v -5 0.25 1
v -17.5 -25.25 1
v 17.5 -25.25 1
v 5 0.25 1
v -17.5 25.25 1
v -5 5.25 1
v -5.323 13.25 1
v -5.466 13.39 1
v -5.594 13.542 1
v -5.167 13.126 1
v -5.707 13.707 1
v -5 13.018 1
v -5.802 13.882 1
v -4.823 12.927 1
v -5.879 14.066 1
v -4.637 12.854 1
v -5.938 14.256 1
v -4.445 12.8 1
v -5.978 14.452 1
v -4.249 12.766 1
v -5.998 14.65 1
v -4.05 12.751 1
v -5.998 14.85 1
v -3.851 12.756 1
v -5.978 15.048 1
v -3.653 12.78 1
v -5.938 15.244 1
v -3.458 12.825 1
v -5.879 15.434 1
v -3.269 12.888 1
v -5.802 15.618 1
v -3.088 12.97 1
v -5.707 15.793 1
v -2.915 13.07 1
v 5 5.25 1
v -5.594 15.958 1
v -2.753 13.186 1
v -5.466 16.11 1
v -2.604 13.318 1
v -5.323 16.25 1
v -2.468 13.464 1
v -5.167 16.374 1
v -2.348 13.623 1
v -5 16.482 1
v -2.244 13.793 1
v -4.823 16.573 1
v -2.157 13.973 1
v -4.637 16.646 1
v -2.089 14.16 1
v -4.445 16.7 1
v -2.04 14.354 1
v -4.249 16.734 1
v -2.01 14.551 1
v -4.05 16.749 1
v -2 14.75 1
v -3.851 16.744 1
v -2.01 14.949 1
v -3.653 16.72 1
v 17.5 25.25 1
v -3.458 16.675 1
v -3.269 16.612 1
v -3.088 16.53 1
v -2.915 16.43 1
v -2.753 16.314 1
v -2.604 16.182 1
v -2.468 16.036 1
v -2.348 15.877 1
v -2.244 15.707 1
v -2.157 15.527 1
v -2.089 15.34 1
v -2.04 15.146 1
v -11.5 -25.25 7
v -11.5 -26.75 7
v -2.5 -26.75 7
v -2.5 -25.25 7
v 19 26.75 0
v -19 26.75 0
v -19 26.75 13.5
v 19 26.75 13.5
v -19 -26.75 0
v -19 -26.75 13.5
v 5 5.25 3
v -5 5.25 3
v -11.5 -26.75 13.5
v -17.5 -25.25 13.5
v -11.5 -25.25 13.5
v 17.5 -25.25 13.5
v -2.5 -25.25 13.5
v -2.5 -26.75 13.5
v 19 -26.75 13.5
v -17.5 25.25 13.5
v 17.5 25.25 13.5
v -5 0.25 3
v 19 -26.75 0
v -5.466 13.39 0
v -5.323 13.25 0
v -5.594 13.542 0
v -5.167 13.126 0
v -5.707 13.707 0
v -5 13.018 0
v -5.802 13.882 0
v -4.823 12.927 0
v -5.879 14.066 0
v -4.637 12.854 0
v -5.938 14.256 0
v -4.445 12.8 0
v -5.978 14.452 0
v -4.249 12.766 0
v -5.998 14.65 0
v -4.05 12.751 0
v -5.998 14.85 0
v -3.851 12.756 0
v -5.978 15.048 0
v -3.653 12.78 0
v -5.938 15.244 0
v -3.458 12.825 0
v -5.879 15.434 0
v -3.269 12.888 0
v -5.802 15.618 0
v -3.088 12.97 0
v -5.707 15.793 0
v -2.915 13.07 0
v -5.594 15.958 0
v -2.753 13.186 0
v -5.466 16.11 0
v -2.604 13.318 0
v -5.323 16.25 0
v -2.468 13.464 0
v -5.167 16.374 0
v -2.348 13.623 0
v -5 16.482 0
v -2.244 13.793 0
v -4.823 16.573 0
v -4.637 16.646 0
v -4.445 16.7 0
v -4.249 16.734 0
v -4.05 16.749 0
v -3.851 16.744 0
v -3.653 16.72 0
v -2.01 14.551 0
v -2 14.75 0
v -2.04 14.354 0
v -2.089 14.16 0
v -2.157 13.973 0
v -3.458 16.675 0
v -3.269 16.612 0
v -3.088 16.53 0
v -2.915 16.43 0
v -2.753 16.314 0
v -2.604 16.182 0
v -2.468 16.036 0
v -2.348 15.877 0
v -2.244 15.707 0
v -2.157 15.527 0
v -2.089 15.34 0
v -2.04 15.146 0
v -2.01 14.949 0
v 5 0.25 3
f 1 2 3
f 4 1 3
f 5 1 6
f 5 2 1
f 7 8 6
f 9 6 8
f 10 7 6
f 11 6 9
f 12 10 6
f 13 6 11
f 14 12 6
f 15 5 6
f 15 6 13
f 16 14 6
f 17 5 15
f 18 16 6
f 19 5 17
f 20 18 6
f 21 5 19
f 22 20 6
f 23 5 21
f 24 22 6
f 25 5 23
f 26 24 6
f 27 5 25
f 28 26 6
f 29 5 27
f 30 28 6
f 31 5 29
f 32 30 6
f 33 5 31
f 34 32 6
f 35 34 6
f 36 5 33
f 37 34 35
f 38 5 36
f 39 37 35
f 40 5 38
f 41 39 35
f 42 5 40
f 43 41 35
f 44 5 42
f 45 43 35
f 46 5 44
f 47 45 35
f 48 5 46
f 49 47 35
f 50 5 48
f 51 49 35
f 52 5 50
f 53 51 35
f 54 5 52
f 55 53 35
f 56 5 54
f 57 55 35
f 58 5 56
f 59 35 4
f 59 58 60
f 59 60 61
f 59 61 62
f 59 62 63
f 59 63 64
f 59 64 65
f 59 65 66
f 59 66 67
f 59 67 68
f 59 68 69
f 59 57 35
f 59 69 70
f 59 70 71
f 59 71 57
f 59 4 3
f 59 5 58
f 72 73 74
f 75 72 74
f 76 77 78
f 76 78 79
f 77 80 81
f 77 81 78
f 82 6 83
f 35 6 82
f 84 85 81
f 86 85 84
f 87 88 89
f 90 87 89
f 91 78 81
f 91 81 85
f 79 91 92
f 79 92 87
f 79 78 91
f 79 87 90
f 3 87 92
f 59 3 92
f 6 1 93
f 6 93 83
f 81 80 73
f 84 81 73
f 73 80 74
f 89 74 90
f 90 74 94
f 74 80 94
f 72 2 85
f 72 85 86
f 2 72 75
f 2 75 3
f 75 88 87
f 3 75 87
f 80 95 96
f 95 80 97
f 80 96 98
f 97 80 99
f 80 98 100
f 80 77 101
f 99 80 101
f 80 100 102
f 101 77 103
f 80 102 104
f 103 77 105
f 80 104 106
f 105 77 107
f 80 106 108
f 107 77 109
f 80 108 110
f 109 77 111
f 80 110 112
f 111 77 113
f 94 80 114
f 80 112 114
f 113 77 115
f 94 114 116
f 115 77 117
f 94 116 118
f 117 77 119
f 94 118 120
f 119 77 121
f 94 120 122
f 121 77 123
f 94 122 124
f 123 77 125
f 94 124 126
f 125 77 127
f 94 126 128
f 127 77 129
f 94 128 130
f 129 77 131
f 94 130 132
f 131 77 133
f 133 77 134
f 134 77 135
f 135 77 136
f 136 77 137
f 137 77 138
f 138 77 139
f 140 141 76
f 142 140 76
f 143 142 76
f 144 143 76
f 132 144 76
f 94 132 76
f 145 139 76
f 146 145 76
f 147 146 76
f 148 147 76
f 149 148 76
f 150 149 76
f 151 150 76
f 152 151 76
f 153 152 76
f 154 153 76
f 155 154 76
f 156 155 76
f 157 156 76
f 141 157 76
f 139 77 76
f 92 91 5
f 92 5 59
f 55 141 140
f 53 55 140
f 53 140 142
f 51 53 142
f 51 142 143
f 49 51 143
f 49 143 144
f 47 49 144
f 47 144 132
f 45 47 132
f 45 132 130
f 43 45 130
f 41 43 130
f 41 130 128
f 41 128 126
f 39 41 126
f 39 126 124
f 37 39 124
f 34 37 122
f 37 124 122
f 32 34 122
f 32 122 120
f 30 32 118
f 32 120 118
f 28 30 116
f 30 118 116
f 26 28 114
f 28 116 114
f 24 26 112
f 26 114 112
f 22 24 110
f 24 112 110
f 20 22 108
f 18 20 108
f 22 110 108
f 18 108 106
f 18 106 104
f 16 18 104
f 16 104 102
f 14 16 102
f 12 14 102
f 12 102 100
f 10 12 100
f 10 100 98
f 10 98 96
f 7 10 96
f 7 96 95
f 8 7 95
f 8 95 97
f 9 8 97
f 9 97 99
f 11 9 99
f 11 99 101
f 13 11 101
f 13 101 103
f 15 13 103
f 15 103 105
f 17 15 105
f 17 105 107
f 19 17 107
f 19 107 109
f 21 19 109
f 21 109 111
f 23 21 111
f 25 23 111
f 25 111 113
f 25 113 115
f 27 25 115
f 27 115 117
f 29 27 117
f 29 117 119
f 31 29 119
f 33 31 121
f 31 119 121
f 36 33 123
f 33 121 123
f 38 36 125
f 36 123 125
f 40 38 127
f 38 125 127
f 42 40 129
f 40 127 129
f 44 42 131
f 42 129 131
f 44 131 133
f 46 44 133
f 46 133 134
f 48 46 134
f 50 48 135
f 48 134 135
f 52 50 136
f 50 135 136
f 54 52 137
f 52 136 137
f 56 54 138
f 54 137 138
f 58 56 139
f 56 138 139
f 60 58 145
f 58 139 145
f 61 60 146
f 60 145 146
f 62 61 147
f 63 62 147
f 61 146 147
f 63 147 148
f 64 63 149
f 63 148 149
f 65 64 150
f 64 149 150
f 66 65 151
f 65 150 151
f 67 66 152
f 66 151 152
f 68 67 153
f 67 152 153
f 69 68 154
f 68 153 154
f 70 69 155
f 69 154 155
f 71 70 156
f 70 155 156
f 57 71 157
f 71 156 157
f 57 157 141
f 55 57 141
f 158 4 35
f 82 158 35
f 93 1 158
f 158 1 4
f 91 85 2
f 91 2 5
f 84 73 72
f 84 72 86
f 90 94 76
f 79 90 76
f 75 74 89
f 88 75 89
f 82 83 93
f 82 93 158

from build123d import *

# Parameters (mm, degrees)
F0_W     = 38
F0_H     = 53.5
F1_DEPTH = 13.5
F2_W     = 35
F2_H     = 50.5
F3_DEPTH = 12.5
F4_R     = 2
F5_DEPTH = 25
F6_W     = 9
F6_H     = 6.5
F7_DEPTH = 25
F8_W     = 10
F8_H     = 5
F9_DEPTH = 2


with BuildPart() as f1:
    # F0 (on Top) → F1 (new body)
    with BuildSketch(Plane.XY):
        Rectangle(F0_W, F0_H)
    extrude(amount=F1_DEPTH)

    # F2 (on face) → F3 (cut)
    with BuildSketch(Plane.XY.offset(13.5)):
        Rectangle(F2_W, F2_H)
    extrude(amount=-F3_DEPTH, mode=Mode.SUBTRACT)

    # F4 (on face) → F5 (cut)
    with BuildSketch(Plane(origin=(0, 0, 0), x_dir=(1, 0, 0), z_dir=(0, 0, -1))):
        with Locations((-4, -14.75)):
            Circle(F4_R)
    extrude(amount=-F5_DEPTH, mode=Mode.SUBTRACT)

    # F6 (on face) → F7 (cut)
    with BuildSketch(Plane.XZ.offset(26.75)):
        with Locations((-7, 10.25)):
            Rectangle(F6_W, F6_H)
    extrude(amount=-F7_DEPTH, mode=Mode.SUBTRACT)

    # F8 (on face) → F9 (join)
    with BuildSketch(Plane.XY.offset(1)):
        with Locations((0, 2.75)):
            Rectangle(F8_W, F8_H)
    extrude(amount=F9_DEPTH)


solid = f1.part
